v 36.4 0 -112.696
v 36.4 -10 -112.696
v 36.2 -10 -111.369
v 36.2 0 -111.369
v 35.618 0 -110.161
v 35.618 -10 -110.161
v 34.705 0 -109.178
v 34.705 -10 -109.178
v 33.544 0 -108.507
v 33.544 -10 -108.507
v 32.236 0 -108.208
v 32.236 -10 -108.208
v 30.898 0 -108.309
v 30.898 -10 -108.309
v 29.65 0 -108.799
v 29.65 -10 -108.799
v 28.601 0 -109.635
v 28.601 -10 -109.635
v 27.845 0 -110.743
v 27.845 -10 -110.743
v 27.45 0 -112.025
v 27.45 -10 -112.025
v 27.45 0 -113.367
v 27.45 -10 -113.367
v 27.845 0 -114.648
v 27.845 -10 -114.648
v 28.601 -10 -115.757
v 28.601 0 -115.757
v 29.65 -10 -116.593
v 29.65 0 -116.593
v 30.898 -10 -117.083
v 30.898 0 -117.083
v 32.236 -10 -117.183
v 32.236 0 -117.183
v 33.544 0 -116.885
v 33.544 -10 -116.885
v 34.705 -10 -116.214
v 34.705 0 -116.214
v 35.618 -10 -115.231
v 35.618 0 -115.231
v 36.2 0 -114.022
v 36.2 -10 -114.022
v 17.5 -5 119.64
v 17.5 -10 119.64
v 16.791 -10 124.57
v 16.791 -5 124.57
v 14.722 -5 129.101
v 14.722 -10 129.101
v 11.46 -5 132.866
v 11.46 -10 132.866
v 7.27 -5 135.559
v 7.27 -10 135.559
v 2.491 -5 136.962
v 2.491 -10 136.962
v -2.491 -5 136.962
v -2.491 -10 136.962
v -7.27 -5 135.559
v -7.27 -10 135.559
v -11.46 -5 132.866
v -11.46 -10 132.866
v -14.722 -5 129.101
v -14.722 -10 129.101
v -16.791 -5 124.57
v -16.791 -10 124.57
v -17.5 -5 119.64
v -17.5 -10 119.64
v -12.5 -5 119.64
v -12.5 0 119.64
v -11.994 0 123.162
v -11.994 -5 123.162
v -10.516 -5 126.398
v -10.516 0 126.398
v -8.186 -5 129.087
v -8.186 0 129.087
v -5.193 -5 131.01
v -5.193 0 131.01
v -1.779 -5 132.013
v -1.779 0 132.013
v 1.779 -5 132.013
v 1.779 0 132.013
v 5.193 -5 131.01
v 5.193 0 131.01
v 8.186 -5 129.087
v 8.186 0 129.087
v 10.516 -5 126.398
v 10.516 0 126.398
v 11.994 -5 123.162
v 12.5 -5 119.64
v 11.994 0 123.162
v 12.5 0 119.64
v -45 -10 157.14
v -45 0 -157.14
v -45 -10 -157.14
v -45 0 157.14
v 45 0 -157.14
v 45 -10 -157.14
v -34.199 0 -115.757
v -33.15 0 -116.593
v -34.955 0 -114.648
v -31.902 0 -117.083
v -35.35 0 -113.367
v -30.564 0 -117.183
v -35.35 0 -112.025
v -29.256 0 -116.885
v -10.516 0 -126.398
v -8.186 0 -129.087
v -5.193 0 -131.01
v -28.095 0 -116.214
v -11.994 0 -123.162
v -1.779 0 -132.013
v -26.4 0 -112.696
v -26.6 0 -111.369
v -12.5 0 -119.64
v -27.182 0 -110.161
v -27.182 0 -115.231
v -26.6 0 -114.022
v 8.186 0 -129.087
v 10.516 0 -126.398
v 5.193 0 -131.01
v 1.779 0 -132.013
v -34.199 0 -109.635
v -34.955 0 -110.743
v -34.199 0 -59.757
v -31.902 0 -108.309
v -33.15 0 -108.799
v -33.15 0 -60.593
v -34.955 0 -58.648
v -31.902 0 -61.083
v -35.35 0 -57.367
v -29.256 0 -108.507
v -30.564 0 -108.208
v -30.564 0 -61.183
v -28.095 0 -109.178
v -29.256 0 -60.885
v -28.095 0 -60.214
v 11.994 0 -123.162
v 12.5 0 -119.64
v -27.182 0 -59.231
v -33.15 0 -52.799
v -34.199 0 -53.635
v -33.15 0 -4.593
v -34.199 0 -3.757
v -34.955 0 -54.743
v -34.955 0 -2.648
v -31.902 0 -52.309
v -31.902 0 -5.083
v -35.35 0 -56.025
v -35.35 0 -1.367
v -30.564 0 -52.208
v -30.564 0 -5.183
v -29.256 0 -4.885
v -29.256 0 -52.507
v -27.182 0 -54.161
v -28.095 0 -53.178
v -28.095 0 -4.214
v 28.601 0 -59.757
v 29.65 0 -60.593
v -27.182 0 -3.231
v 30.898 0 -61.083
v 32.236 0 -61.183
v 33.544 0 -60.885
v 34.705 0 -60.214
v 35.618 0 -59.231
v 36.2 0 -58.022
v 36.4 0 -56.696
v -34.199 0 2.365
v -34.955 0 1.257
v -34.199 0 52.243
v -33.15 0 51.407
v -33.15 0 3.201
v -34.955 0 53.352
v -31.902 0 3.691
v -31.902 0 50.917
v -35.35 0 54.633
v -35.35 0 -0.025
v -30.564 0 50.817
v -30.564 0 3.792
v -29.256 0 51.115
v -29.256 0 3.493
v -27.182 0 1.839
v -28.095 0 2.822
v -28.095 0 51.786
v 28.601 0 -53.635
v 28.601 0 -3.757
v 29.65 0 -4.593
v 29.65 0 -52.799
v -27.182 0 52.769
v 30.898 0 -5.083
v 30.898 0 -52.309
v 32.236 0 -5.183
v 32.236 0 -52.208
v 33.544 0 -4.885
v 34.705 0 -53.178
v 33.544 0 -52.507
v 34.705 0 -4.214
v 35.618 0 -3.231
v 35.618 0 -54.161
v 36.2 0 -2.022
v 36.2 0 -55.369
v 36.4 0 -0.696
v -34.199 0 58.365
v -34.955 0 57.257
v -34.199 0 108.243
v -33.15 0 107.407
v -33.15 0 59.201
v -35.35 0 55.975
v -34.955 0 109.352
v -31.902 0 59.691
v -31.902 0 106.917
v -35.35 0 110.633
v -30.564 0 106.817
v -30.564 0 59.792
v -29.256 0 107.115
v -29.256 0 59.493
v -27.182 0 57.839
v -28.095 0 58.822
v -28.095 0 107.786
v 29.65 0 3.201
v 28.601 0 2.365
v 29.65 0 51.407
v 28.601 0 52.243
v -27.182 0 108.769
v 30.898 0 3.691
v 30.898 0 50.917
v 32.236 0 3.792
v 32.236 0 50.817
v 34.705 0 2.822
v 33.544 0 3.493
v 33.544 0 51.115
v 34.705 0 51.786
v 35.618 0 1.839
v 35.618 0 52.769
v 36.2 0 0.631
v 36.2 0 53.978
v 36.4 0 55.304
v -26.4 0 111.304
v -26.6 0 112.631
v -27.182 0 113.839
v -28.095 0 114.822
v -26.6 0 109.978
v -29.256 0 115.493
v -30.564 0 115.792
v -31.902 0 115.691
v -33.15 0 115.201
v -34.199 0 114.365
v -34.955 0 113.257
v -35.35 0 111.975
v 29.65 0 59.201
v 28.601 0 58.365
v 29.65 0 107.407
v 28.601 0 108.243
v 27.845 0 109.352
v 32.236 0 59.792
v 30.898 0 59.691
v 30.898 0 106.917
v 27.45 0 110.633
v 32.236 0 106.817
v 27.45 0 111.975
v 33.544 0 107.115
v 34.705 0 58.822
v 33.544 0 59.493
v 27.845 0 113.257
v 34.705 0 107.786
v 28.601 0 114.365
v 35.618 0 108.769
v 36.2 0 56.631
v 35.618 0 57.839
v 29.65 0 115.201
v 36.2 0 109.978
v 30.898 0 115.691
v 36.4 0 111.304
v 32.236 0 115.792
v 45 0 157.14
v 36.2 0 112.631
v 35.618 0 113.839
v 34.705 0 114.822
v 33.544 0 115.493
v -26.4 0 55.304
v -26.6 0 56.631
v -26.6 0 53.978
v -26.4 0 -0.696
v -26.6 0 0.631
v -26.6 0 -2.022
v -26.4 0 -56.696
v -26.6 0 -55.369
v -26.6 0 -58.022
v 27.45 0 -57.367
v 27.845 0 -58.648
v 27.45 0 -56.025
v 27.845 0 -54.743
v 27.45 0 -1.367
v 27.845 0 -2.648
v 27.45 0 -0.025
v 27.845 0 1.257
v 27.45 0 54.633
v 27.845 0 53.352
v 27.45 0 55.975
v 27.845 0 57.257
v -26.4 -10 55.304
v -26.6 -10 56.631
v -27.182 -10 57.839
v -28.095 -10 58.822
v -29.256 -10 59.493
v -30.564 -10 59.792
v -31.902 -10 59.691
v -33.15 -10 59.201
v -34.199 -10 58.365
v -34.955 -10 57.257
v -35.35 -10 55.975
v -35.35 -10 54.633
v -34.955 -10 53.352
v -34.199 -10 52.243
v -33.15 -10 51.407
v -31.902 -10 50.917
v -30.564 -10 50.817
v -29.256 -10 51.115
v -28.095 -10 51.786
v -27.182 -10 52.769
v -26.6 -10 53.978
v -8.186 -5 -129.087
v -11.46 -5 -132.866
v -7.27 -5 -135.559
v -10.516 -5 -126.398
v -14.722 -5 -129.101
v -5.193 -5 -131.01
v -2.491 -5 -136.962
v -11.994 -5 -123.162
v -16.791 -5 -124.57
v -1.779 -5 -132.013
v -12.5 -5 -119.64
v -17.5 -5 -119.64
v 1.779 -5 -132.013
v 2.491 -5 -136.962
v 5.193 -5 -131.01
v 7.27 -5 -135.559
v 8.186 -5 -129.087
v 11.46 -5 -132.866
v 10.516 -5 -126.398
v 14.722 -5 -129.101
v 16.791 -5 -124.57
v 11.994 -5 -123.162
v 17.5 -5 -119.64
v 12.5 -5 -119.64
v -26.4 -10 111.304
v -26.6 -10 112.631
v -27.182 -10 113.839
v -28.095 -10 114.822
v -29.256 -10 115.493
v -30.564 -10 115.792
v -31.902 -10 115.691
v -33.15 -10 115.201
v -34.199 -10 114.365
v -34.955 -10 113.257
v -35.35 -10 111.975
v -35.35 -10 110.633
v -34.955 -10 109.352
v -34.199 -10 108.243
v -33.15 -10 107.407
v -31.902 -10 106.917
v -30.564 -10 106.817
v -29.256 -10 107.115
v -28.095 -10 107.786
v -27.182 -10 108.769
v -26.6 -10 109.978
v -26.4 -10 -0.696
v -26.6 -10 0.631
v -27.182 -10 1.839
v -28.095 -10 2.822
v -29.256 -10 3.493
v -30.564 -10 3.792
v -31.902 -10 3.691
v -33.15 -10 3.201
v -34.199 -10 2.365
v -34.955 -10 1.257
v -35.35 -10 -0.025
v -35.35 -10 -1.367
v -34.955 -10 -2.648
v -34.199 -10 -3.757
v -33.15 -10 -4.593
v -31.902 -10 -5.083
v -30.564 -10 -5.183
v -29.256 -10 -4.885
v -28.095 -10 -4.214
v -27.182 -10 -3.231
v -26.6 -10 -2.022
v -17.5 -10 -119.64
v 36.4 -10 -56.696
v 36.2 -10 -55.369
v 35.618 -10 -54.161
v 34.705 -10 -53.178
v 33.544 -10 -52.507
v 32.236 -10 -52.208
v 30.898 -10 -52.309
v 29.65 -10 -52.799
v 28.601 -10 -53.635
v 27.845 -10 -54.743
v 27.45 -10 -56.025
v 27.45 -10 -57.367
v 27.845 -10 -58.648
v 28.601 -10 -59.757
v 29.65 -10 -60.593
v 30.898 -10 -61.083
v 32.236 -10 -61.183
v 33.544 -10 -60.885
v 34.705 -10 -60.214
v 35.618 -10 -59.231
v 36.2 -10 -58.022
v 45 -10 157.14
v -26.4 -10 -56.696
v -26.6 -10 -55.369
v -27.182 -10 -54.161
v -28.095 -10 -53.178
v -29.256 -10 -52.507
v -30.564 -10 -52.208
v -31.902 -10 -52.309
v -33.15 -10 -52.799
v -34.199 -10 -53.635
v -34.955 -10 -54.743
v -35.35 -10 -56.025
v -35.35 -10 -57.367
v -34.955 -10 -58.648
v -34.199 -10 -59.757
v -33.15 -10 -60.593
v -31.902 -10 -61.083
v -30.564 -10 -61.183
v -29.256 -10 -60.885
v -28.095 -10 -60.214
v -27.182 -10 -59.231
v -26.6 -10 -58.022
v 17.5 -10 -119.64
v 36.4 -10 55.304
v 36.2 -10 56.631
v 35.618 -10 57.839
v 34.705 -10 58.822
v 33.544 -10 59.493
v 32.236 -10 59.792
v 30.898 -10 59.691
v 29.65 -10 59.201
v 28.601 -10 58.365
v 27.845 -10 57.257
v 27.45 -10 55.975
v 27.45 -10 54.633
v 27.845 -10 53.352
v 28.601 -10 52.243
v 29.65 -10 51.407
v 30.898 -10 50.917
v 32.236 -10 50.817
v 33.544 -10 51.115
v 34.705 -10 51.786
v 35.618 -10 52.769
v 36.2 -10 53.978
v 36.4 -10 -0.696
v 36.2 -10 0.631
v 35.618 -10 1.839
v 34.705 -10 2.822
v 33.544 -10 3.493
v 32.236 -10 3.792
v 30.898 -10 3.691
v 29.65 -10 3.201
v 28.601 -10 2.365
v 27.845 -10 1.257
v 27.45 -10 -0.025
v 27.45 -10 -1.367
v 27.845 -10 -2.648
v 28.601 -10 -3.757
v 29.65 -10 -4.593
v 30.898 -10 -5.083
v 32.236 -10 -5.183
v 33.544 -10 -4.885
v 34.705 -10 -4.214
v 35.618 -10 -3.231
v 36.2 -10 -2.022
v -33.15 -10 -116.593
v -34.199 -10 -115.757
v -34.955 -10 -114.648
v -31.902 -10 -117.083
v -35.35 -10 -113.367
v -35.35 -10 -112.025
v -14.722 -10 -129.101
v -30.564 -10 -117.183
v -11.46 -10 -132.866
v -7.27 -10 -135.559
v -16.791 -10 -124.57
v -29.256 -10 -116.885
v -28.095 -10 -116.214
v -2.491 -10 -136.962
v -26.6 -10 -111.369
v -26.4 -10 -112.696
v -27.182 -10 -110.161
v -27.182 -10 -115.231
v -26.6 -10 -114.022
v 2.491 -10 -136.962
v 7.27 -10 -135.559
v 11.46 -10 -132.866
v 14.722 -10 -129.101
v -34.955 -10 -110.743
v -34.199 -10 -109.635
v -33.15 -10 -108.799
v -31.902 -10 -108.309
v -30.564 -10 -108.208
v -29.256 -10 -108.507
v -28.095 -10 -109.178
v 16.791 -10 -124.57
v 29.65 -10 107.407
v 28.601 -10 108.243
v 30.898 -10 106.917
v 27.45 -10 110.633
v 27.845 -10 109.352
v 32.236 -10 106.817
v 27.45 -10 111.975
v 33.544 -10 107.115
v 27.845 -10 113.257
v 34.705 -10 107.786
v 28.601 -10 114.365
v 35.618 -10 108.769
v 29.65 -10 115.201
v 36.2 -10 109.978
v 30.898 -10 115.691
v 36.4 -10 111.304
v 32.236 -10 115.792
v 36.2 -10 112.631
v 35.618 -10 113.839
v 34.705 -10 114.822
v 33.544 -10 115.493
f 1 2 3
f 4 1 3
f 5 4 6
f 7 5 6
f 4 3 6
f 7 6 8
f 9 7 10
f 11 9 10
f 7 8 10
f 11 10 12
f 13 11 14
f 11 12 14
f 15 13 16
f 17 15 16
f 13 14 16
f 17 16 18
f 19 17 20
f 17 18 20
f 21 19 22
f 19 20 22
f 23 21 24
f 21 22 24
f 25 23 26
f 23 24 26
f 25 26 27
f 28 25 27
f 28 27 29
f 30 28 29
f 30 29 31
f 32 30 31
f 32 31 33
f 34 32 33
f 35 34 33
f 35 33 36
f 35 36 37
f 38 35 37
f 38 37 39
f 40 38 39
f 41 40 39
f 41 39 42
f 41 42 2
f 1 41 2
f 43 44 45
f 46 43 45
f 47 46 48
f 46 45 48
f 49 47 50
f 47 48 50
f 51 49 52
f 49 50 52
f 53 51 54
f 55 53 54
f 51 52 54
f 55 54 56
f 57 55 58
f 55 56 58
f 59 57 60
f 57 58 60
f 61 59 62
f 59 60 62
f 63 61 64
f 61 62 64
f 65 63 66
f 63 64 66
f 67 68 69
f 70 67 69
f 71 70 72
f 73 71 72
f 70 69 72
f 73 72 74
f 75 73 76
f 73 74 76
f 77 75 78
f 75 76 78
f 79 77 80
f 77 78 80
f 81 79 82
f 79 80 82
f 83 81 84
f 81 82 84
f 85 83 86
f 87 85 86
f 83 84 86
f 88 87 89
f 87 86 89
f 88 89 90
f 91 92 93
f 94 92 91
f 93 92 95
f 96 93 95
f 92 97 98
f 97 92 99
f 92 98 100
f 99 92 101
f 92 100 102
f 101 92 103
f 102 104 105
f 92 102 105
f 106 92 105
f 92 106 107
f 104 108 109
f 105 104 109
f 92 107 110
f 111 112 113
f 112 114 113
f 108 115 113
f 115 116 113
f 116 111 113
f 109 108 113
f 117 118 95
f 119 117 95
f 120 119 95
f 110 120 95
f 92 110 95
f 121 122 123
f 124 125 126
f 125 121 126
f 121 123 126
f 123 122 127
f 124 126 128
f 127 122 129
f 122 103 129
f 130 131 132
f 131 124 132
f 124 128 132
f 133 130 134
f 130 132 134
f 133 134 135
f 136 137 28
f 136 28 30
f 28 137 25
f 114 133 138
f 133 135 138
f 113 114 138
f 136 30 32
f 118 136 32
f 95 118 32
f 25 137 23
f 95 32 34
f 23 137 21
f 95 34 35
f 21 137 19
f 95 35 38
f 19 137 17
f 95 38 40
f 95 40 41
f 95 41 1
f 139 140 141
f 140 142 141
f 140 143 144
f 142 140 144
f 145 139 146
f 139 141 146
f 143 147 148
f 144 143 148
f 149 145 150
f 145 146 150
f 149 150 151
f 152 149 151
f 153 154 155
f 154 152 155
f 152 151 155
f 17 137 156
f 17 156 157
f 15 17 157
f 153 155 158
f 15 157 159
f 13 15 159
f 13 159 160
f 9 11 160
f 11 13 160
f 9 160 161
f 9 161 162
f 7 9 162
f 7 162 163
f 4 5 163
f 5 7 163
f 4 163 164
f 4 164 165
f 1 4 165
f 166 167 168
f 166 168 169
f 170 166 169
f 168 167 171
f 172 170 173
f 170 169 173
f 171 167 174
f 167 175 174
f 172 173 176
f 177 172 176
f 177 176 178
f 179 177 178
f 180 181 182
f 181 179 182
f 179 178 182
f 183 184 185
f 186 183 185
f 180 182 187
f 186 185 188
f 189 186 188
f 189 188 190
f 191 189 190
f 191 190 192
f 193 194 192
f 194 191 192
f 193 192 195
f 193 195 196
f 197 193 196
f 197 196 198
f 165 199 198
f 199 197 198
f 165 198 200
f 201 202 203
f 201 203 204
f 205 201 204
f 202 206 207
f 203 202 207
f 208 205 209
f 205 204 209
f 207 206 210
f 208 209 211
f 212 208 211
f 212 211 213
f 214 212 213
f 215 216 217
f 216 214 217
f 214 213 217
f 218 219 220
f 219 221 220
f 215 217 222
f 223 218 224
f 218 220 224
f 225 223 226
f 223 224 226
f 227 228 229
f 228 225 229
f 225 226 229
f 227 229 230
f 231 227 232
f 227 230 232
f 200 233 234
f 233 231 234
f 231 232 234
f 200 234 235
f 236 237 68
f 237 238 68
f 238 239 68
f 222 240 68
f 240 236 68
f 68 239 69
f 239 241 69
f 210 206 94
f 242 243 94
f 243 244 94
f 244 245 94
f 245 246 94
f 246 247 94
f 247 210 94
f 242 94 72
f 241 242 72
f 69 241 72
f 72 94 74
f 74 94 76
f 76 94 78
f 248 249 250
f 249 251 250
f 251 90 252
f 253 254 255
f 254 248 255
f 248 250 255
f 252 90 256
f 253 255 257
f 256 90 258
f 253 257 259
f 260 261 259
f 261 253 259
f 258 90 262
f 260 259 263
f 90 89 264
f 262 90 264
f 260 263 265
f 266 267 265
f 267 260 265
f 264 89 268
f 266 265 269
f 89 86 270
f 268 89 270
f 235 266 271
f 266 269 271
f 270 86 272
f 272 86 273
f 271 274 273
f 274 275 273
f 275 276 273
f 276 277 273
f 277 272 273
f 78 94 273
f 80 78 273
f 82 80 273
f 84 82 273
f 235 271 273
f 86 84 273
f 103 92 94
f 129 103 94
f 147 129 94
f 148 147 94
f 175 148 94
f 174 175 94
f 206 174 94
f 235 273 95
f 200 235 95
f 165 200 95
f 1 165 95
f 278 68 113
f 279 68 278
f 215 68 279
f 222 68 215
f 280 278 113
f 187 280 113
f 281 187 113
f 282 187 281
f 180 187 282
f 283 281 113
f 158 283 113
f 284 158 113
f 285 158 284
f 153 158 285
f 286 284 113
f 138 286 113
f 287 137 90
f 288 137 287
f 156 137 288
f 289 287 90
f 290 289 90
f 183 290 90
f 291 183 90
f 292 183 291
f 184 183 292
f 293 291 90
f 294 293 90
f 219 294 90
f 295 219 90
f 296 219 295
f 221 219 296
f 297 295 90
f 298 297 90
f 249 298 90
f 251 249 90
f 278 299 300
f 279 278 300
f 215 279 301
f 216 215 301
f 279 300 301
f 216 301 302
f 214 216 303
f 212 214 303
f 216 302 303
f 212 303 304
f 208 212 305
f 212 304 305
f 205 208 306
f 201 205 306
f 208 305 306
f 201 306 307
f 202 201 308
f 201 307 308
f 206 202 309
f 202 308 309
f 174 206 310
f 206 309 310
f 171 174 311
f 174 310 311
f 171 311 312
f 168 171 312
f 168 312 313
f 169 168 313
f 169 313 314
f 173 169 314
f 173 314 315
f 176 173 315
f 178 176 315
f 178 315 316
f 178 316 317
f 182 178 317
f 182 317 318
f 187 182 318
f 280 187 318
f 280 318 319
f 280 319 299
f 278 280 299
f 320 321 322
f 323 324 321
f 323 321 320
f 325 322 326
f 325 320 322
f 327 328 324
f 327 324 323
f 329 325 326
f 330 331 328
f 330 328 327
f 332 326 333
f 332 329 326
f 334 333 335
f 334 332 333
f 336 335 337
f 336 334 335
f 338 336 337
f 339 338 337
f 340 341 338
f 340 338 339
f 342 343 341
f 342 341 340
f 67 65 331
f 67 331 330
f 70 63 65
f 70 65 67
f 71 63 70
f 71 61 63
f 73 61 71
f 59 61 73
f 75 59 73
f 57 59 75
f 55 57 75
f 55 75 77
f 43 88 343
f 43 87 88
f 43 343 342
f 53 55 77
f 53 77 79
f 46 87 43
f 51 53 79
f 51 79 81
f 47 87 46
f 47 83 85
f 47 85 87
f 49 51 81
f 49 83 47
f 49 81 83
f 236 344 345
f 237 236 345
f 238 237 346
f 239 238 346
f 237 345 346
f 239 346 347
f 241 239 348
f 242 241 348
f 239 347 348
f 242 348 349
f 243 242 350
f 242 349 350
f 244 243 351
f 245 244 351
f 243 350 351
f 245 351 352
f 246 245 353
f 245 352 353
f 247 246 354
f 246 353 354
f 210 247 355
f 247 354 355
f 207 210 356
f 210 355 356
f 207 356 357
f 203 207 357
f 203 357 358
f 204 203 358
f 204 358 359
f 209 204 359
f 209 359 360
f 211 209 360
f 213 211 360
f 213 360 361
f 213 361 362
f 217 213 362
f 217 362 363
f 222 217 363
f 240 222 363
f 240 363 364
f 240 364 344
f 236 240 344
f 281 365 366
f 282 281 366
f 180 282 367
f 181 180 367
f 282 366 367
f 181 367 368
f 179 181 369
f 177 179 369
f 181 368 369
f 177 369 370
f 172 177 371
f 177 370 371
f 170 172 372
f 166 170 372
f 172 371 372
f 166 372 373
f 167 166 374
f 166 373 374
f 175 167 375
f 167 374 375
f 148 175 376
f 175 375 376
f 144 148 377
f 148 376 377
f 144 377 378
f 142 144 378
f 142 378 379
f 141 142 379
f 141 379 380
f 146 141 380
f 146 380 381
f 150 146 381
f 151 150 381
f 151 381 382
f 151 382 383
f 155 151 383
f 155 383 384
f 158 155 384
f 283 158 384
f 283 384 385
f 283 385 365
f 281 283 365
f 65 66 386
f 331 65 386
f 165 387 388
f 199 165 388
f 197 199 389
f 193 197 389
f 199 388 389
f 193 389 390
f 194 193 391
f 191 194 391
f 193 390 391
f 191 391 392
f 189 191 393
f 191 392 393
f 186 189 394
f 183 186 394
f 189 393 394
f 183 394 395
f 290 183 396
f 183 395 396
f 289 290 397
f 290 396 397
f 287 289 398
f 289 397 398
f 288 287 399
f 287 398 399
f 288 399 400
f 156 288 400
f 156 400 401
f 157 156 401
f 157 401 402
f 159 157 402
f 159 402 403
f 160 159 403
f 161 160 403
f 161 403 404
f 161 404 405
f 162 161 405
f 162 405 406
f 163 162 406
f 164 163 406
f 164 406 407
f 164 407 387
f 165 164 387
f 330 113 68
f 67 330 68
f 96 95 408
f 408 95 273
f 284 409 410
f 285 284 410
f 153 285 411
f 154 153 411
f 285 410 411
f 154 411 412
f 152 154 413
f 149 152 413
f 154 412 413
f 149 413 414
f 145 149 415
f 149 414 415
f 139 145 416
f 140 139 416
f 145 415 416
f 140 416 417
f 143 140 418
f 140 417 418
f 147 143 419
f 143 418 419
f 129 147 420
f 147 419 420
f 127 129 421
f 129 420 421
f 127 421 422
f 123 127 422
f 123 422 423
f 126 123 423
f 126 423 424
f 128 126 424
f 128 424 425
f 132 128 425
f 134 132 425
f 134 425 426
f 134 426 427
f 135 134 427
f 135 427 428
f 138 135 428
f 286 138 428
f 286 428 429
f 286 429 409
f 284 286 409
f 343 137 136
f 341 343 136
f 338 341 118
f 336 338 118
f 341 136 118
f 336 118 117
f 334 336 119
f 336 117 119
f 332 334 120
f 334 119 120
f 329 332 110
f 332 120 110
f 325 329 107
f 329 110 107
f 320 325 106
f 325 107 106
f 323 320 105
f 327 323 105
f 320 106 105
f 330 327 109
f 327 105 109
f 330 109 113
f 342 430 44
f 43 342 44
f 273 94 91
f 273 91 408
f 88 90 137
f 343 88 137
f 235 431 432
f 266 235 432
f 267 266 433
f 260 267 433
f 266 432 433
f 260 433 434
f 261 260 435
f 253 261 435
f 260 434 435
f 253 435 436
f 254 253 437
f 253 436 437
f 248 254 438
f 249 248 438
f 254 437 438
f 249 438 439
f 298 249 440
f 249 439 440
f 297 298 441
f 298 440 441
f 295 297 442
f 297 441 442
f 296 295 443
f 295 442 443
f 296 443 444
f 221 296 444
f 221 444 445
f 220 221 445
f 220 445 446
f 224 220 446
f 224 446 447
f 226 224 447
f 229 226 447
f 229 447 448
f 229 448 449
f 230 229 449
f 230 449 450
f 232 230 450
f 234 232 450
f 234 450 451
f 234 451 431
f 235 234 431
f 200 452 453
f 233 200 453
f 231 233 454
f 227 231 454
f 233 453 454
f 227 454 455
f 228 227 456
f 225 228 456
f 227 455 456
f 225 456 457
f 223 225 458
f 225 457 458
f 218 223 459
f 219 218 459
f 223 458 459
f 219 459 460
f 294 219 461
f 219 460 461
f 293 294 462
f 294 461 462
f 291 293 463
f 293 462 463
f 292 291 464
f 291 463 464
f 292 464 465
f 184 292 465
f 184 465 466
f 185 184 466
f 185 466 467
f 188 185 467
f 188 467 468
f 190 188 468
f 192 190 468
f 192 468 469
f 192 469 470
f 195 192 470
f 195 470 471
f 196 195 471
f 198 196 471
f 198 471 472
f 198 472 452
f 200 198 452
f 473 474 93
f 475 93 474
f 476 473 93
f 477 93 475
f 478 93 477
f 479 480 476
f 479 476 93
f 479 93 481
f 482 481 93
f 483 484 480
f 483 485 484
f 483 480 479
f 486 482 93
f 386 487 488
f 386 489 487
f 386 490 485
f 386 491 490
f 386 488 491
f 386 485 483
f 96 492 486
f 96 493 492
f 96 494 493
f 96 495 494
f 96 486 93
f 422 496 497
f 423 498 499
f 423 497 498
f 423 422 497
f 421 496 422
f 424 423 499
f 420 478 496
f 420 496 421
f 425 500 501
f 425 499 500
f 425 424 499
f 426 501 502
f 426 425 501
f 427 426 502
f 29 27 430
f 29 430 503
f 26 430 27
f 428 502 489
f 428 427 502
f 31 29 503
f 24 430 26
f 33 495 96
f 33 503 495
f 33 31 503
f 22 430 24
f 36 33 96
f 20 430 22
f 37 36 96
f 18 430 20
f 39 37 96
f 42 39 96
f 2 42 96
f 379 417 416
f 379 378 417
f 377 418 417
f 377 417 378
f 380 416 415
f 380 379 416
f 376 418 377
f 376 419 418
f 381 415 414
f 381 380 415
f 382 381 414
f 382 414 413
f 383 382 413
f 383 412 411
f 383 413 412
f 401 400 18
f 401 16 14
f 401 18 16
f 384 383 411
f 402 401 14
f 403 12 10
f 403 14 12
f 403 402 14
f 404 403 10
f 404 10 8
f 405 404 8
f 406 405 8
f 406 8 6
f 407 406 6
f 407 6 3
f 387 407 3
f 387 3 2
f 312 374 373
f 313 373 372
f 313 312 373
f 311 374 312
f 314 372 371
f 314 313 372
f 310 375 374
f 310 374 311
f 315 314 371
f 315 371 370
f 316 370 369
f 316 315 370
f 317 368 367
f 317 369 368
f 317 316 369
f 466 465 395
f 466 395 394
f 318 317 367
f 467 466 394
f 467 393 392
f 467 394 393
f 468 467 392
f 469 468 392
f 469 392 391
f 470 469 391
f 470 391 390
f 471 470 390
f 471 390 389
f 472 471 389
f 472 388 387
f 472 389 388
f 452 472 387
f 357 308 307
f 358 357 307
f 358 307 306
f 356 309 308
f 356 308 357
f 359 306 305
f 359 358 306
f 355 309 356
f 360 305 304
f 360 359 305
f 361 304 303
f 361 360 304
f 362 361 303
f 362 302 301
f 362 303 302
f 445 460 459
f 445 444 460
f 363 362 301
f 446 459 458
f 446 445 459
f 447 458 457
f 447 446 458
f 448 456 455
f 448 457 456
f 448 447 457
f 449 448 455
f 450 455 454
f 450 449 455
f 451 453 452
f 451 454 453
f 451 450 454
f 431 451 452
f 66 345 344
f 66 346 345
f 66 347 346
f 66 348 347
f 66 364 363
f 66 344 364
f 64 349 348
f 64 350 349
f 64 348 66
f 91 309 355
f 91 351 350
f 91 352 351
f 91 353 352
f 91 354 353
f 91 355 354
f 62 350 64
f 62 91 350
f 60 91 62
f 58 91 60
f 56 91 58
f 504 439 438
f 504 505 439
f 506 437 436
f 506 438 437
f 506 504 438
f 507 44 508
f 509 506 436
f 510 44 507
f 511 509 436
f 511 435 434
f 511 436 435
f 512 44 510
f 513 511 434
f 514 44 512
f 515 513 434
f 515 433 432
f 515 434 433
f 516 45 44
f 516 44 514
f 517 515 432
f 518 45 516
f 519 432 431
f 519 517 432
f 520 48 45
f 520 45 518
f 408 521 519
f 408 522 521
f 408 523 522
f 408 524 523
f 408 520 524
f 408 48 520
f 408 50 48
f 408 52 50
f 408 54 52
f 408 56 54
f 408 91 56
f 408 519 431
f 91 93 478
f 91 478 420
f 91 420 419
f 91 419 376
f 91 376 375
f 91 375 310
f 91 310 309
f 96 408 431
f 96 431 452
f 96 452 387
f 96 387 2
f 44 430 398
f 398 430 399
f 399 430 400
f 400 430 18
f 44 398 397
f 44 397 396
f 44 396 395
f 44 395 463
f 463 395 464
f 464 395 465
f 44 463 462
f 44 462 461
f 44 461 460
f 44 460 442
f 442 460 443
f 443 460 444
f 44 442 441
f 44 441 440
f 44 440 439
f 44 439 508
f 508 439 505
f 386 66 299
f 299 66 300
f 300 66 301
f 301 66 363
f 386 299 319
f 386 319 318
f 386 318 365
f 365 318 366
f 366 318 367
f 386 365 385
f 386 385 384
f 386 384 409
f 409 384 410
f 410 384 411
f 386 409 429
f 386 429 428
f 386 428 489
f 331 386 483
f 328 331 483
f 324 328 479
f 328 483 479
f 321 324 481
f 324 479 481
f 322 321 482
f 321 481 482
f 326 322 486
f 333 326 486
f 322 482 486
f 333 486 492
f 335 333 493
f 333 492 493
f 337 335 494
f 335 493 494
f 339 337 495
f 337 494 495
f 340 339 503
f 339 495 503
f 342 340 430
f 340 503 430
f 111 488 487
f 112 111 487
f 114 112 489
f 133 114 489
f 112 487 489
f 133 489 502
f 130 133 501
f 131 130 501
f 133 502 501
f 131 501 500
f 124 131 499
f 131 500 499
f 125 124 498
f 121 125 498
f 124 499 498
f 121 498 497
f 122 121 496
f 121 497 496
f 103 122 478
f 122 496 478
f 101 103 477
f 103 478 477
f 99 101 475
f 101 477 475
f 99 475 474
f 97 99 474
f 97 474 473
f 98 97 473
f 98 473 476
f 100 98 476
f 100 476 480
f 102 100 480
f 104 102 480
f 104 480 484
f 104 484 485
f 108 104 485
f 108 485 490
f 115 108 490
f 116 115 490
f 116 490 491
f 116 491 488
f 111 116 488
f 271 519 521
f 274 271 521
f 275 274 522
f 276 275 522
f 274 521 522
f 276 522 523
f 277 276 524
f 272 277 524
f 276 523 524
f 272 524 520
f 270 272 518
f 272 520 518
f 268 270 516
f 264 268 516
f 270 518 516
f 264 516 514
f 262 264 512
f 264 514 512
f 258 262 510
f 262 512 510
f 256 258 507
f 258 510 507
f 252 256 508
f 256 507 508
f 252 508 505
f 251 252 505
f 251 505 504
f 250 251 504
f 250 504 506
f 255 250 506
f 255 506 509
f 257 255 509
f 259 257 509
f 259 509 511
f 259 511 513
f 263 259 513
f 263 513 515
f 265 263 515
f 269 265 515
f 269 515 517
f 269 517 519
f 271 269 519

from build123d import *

# Parameters (mm, degrees)
F0_W     = 90
F0_H     = 314.28
F1_DEPTH = 10
F3_DEPTH = 5
F4_R     = 4.5
F5_DEPTH = 25


with BuildPart() as f1:
    # F0 (on Front) → F1 (new body)
    with BuildSketch(Plane.XZ):
        Rectangle(F0_W, F0_H)
        with BuildLine():
            Line((-12.5, -119.64), (-12.5, 119.64))
            ThreePointArc((-12.5, 119.64), (0, 132.14), (12.5, 119.64))
            Line((12.5, 119.64), (12.5, -119.64))
            ThreePointArc((12.5, -119.64), (0, -132.14), (-12.5, -119.64))
        make_face(mode=Mode.SUBTRACT)
    extrude(amount=F1_DEPTH)

    # F2 (on face) → F3 (cut)
    with BuildSketch(Plane.XZ.offset(10)):
        with BuildLine():
            Line((17.5, -119.64), (17.5, 119.64))
            ThreePointArc((17.5, 119.64), (0, 137.14), (-17.5, 119.64))
            Line((-17.5, 119.64), (-17.5, -119.64))
            ThreePointArc((-17.5, -119.64), (0, -137.14), (17.5, -119.64))
        make_face()
    extrude(amount=-F3_DEPTH, mode=Mode.SUBTRACT)

    # F4 (on face) → F5 (cut)
    with BuildSketch(Plane.XZ.offset(10)):
        with Locations((31.899736, -112.695811)):
            Circle(F4_R)
        with Locations((-30.900264, -112.695811)):
            Circle(F4_R)
        with Locations((31.899736, -56.695811)):
            Circle(F4_R)
        with Locations((31.899736, -0.695811)):
            Circle(F4_R)
        with Locations((31.899736, 55.304189)):
            Circle(F4_R)
        with Locations((31.899736, 111.304189)):
            Circle(F4_R)
        with Locations((-30.900264, 111.304189)):
            Circle(F4_R)
        with Locations((-30.900264, 55.304189)):
            Circle(F4_R)
        with Locations((-30.900264, -0.695811)):
            Circle(F4_R)
        with Locations((-30.900264, -56.695811)):
            Circle(F4_R)
    extrude(amount=-F5_DEPTH, mode=Mode.SUBTRACT)


solid = f1.part
